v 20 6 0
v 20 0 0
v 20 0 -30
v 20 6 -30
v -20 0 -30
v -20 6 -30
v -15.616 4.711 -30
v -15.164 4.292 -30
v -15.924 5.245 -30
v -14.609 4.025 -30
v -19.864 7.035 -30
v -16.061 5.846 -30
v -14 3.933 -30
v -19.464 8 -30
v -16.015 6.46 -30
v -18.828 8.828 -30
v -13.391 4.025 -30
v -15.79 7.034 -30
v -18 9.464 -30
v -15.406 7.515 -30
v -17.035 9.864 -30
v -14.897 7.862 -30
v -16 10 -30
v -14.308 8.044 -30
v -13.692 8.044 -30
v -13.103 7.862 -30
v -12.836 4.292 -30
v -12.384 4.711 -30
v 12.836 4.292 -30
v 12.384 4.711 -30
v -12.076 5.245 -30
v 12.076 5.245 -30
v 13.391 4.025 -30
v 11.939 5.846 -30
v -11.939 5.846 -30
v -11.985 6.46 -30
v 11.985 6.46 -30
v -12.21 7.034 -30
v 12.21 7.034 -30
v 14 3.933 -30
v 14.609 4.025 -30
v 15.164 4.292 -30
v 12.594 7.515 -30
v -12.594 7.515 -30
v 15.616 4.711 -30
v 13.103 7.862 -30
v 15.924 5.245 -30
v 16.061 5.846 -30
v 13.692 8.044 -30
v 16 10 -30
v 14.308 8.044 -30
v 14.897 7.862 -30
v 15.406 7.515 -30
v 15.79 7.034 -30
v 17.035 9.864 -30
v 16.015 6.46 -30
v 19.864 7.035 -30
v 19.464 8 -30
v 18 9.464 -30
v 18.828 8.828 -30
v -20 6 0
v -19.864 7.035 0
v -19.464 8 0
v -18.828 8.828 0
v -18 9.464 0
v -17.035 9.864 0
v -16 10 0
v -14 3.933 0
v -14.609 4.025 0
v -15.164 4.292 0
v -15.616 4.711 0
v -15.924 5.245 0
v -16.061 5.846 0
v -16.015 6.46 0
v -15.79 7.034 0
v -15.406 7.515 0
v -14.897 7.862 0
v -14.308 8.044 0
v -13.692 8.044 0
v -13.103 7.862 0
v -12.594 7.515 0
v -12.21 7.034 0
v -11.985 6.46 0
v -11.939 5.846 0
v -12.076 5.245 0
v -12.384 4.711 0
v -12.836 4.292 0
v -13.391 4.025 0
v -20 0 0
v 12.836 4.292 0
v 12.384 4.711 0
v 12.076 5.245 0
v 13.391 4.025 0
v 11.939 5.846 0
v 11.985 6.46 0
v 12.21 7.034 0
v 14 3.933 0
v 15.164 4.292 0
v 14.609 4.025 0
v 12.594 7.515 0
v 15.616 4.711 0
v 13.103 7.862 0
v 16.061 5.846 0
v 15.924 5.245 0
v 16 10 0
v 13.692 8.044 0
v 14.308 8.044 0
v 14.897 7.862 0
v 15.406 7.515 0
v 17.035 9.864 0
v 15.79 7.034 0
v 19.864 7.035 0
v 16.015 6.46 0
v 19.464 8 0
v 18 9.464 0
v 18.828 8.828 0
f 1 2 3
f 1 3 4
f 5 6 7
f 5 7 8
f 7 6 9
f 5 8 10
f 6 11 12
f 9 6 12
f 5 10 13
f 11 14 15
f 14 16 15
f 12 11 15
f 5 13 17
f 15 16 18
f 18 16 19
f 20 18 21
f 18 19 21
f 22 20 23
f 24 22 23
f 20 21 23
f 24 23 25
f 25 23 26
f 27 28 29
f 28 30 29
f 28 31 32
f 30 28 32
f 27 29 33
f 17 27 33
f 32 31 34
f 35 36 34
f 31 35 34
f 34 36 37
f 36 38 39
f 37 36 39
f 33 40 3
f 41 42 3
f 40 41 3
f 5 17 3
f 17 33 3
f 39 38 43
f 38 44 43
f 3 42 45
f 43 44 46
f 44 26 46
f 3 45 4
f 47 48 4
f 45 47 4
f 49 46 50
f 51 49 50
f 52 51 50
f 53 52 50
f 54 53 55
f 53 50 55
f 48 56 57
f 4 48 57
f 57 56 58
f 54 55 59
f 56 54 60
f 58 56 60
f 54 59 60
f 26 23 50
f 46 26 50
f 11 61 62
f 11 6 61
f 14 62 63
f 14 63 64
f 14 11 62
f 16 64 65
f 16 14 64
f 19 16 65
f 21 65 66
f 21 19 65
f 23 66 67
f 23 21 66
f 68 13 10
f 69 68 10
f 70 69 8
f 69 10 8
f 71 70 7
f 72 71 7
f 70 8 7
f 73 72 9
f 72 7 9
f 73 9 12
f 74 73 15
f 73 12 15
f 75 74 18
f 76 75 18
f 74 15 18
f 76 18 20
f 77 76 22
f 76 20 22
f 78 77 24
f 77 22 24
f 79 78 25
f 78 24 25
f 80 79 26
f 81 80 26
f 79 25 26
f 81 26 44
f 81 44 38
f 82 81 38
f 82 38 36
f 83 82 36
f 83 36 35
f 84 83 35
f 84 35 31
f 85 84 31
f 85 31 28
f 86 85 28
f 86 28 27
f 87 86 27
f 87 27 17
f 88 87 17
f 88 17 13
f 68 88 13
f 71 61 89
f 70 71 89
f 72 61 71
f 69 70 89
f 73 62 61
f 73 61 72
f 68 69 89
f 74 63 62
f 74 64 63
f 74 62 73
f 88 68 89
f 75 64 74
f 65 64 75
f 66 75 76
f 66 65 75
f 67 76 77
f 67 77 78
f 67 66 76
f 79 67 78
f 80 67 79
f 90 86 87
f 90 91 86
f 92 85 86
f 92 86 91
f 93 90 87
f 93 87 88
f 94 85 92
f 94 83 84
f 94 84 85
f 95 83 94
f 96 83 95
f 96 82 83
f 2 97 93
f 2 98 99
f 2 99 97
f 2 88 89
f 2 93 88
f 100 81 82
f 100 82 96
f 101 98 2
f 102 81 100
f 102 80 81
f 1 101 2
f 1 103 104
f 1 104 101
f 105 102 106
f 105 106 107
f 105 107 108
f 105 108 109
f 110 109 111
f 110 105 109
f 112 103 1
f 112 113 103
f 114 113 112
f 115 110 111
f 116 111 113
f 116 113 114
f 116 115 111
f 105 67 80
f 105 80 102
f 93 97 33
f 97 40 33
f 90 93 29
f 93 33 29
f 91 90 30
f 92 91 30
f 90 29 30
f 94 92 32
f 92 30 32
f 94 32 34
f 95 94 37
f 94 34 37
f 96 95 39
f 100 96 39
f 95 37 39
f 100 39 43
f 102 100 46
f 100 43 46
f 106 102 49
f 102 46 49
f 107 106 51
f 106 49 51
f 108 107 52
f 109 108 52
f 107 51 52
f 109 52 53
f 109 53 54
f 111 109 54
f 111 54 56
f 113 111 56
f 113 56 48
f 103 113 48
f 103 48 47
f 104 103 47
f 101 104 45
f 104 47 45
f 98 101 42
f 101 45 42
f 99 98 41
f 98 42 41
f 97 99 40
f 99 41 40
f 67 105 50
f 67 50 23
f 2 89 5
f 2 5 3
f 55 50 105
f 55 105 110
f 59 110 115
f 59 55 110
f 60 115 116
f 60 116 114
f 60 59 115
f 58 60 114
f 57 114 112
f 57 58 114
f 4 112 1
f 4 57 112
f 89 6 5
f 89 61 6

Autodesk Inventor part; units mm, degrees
ref_plane "YZ Plane" through (0, 0, 0) normal (1, 0, 0) x (0, 1, 0)
ref_plane "XZ Plane" through (0, 0, 0) normal (0, 1, 0) x (-1, 0, 0)
ref_plane "XY Plane" through (0, 0, 0) normal (0, 0, 1) x (1, 0, 0)
sketch "Sketch1" plane through (0, 0, 0) normal (0, 0, 1) x (1, 0, 0)
  line L0 (-20, 0) -> (20, 0)
  line L1 (20, 0) -> (20, 10)
  line L2 (20, 10) -> (-20, 10)
  line L3 (-20, 10) -> (-20, 0)
  point P0 (0, 0)
  point P1 (0, 0)
  dimension "d0" = 40
  dimension "d1" = 10
extrude "Extrusion1" add sketch "Sketch1" against normal blind 30
fillet "Fillet1" radius 4 2 edges at (20, 10, -15) (-20, 10, -15)
sketch "Sketch2" plane through (0, 0, 0) normal (0, 0, 1) x (1, 0, 0)
  arc A0 (-16, 10) -> (-20, 6) centre (-16, 6) ccw projected
  line L0 (-20, 6) -> (-20, 0) projected
  line L1 (-20, 0) -> (20, 0) projected
  line L2 (20, 0) -> (20, 6) projected
  arc A1 (20, 6) -> (16, 10) centre (16, 6) ccw projected
  line L3 (16, 10) -> (-16, 10) projected
  line L4 (-20, 0) -> (20, 0) projected
  point P0 (0, 0)
  point P1 (-14, 6)
  point P2 (14, 6)
  point P3 (0, 0)
  dimension "d12" = 28
  dimension "d13" = 14
hole "Hole1" at (-14, 6, 0) at (14, 6, 0) direction (0, 0, -1) diameter 4.134 depth 30 thread size "M5x0.8" class "6H" standard "ISO Metric profile"
equation "\"d13\" = 0.5 * d12"
properties part number "02A" material "Aluminum 6061"
